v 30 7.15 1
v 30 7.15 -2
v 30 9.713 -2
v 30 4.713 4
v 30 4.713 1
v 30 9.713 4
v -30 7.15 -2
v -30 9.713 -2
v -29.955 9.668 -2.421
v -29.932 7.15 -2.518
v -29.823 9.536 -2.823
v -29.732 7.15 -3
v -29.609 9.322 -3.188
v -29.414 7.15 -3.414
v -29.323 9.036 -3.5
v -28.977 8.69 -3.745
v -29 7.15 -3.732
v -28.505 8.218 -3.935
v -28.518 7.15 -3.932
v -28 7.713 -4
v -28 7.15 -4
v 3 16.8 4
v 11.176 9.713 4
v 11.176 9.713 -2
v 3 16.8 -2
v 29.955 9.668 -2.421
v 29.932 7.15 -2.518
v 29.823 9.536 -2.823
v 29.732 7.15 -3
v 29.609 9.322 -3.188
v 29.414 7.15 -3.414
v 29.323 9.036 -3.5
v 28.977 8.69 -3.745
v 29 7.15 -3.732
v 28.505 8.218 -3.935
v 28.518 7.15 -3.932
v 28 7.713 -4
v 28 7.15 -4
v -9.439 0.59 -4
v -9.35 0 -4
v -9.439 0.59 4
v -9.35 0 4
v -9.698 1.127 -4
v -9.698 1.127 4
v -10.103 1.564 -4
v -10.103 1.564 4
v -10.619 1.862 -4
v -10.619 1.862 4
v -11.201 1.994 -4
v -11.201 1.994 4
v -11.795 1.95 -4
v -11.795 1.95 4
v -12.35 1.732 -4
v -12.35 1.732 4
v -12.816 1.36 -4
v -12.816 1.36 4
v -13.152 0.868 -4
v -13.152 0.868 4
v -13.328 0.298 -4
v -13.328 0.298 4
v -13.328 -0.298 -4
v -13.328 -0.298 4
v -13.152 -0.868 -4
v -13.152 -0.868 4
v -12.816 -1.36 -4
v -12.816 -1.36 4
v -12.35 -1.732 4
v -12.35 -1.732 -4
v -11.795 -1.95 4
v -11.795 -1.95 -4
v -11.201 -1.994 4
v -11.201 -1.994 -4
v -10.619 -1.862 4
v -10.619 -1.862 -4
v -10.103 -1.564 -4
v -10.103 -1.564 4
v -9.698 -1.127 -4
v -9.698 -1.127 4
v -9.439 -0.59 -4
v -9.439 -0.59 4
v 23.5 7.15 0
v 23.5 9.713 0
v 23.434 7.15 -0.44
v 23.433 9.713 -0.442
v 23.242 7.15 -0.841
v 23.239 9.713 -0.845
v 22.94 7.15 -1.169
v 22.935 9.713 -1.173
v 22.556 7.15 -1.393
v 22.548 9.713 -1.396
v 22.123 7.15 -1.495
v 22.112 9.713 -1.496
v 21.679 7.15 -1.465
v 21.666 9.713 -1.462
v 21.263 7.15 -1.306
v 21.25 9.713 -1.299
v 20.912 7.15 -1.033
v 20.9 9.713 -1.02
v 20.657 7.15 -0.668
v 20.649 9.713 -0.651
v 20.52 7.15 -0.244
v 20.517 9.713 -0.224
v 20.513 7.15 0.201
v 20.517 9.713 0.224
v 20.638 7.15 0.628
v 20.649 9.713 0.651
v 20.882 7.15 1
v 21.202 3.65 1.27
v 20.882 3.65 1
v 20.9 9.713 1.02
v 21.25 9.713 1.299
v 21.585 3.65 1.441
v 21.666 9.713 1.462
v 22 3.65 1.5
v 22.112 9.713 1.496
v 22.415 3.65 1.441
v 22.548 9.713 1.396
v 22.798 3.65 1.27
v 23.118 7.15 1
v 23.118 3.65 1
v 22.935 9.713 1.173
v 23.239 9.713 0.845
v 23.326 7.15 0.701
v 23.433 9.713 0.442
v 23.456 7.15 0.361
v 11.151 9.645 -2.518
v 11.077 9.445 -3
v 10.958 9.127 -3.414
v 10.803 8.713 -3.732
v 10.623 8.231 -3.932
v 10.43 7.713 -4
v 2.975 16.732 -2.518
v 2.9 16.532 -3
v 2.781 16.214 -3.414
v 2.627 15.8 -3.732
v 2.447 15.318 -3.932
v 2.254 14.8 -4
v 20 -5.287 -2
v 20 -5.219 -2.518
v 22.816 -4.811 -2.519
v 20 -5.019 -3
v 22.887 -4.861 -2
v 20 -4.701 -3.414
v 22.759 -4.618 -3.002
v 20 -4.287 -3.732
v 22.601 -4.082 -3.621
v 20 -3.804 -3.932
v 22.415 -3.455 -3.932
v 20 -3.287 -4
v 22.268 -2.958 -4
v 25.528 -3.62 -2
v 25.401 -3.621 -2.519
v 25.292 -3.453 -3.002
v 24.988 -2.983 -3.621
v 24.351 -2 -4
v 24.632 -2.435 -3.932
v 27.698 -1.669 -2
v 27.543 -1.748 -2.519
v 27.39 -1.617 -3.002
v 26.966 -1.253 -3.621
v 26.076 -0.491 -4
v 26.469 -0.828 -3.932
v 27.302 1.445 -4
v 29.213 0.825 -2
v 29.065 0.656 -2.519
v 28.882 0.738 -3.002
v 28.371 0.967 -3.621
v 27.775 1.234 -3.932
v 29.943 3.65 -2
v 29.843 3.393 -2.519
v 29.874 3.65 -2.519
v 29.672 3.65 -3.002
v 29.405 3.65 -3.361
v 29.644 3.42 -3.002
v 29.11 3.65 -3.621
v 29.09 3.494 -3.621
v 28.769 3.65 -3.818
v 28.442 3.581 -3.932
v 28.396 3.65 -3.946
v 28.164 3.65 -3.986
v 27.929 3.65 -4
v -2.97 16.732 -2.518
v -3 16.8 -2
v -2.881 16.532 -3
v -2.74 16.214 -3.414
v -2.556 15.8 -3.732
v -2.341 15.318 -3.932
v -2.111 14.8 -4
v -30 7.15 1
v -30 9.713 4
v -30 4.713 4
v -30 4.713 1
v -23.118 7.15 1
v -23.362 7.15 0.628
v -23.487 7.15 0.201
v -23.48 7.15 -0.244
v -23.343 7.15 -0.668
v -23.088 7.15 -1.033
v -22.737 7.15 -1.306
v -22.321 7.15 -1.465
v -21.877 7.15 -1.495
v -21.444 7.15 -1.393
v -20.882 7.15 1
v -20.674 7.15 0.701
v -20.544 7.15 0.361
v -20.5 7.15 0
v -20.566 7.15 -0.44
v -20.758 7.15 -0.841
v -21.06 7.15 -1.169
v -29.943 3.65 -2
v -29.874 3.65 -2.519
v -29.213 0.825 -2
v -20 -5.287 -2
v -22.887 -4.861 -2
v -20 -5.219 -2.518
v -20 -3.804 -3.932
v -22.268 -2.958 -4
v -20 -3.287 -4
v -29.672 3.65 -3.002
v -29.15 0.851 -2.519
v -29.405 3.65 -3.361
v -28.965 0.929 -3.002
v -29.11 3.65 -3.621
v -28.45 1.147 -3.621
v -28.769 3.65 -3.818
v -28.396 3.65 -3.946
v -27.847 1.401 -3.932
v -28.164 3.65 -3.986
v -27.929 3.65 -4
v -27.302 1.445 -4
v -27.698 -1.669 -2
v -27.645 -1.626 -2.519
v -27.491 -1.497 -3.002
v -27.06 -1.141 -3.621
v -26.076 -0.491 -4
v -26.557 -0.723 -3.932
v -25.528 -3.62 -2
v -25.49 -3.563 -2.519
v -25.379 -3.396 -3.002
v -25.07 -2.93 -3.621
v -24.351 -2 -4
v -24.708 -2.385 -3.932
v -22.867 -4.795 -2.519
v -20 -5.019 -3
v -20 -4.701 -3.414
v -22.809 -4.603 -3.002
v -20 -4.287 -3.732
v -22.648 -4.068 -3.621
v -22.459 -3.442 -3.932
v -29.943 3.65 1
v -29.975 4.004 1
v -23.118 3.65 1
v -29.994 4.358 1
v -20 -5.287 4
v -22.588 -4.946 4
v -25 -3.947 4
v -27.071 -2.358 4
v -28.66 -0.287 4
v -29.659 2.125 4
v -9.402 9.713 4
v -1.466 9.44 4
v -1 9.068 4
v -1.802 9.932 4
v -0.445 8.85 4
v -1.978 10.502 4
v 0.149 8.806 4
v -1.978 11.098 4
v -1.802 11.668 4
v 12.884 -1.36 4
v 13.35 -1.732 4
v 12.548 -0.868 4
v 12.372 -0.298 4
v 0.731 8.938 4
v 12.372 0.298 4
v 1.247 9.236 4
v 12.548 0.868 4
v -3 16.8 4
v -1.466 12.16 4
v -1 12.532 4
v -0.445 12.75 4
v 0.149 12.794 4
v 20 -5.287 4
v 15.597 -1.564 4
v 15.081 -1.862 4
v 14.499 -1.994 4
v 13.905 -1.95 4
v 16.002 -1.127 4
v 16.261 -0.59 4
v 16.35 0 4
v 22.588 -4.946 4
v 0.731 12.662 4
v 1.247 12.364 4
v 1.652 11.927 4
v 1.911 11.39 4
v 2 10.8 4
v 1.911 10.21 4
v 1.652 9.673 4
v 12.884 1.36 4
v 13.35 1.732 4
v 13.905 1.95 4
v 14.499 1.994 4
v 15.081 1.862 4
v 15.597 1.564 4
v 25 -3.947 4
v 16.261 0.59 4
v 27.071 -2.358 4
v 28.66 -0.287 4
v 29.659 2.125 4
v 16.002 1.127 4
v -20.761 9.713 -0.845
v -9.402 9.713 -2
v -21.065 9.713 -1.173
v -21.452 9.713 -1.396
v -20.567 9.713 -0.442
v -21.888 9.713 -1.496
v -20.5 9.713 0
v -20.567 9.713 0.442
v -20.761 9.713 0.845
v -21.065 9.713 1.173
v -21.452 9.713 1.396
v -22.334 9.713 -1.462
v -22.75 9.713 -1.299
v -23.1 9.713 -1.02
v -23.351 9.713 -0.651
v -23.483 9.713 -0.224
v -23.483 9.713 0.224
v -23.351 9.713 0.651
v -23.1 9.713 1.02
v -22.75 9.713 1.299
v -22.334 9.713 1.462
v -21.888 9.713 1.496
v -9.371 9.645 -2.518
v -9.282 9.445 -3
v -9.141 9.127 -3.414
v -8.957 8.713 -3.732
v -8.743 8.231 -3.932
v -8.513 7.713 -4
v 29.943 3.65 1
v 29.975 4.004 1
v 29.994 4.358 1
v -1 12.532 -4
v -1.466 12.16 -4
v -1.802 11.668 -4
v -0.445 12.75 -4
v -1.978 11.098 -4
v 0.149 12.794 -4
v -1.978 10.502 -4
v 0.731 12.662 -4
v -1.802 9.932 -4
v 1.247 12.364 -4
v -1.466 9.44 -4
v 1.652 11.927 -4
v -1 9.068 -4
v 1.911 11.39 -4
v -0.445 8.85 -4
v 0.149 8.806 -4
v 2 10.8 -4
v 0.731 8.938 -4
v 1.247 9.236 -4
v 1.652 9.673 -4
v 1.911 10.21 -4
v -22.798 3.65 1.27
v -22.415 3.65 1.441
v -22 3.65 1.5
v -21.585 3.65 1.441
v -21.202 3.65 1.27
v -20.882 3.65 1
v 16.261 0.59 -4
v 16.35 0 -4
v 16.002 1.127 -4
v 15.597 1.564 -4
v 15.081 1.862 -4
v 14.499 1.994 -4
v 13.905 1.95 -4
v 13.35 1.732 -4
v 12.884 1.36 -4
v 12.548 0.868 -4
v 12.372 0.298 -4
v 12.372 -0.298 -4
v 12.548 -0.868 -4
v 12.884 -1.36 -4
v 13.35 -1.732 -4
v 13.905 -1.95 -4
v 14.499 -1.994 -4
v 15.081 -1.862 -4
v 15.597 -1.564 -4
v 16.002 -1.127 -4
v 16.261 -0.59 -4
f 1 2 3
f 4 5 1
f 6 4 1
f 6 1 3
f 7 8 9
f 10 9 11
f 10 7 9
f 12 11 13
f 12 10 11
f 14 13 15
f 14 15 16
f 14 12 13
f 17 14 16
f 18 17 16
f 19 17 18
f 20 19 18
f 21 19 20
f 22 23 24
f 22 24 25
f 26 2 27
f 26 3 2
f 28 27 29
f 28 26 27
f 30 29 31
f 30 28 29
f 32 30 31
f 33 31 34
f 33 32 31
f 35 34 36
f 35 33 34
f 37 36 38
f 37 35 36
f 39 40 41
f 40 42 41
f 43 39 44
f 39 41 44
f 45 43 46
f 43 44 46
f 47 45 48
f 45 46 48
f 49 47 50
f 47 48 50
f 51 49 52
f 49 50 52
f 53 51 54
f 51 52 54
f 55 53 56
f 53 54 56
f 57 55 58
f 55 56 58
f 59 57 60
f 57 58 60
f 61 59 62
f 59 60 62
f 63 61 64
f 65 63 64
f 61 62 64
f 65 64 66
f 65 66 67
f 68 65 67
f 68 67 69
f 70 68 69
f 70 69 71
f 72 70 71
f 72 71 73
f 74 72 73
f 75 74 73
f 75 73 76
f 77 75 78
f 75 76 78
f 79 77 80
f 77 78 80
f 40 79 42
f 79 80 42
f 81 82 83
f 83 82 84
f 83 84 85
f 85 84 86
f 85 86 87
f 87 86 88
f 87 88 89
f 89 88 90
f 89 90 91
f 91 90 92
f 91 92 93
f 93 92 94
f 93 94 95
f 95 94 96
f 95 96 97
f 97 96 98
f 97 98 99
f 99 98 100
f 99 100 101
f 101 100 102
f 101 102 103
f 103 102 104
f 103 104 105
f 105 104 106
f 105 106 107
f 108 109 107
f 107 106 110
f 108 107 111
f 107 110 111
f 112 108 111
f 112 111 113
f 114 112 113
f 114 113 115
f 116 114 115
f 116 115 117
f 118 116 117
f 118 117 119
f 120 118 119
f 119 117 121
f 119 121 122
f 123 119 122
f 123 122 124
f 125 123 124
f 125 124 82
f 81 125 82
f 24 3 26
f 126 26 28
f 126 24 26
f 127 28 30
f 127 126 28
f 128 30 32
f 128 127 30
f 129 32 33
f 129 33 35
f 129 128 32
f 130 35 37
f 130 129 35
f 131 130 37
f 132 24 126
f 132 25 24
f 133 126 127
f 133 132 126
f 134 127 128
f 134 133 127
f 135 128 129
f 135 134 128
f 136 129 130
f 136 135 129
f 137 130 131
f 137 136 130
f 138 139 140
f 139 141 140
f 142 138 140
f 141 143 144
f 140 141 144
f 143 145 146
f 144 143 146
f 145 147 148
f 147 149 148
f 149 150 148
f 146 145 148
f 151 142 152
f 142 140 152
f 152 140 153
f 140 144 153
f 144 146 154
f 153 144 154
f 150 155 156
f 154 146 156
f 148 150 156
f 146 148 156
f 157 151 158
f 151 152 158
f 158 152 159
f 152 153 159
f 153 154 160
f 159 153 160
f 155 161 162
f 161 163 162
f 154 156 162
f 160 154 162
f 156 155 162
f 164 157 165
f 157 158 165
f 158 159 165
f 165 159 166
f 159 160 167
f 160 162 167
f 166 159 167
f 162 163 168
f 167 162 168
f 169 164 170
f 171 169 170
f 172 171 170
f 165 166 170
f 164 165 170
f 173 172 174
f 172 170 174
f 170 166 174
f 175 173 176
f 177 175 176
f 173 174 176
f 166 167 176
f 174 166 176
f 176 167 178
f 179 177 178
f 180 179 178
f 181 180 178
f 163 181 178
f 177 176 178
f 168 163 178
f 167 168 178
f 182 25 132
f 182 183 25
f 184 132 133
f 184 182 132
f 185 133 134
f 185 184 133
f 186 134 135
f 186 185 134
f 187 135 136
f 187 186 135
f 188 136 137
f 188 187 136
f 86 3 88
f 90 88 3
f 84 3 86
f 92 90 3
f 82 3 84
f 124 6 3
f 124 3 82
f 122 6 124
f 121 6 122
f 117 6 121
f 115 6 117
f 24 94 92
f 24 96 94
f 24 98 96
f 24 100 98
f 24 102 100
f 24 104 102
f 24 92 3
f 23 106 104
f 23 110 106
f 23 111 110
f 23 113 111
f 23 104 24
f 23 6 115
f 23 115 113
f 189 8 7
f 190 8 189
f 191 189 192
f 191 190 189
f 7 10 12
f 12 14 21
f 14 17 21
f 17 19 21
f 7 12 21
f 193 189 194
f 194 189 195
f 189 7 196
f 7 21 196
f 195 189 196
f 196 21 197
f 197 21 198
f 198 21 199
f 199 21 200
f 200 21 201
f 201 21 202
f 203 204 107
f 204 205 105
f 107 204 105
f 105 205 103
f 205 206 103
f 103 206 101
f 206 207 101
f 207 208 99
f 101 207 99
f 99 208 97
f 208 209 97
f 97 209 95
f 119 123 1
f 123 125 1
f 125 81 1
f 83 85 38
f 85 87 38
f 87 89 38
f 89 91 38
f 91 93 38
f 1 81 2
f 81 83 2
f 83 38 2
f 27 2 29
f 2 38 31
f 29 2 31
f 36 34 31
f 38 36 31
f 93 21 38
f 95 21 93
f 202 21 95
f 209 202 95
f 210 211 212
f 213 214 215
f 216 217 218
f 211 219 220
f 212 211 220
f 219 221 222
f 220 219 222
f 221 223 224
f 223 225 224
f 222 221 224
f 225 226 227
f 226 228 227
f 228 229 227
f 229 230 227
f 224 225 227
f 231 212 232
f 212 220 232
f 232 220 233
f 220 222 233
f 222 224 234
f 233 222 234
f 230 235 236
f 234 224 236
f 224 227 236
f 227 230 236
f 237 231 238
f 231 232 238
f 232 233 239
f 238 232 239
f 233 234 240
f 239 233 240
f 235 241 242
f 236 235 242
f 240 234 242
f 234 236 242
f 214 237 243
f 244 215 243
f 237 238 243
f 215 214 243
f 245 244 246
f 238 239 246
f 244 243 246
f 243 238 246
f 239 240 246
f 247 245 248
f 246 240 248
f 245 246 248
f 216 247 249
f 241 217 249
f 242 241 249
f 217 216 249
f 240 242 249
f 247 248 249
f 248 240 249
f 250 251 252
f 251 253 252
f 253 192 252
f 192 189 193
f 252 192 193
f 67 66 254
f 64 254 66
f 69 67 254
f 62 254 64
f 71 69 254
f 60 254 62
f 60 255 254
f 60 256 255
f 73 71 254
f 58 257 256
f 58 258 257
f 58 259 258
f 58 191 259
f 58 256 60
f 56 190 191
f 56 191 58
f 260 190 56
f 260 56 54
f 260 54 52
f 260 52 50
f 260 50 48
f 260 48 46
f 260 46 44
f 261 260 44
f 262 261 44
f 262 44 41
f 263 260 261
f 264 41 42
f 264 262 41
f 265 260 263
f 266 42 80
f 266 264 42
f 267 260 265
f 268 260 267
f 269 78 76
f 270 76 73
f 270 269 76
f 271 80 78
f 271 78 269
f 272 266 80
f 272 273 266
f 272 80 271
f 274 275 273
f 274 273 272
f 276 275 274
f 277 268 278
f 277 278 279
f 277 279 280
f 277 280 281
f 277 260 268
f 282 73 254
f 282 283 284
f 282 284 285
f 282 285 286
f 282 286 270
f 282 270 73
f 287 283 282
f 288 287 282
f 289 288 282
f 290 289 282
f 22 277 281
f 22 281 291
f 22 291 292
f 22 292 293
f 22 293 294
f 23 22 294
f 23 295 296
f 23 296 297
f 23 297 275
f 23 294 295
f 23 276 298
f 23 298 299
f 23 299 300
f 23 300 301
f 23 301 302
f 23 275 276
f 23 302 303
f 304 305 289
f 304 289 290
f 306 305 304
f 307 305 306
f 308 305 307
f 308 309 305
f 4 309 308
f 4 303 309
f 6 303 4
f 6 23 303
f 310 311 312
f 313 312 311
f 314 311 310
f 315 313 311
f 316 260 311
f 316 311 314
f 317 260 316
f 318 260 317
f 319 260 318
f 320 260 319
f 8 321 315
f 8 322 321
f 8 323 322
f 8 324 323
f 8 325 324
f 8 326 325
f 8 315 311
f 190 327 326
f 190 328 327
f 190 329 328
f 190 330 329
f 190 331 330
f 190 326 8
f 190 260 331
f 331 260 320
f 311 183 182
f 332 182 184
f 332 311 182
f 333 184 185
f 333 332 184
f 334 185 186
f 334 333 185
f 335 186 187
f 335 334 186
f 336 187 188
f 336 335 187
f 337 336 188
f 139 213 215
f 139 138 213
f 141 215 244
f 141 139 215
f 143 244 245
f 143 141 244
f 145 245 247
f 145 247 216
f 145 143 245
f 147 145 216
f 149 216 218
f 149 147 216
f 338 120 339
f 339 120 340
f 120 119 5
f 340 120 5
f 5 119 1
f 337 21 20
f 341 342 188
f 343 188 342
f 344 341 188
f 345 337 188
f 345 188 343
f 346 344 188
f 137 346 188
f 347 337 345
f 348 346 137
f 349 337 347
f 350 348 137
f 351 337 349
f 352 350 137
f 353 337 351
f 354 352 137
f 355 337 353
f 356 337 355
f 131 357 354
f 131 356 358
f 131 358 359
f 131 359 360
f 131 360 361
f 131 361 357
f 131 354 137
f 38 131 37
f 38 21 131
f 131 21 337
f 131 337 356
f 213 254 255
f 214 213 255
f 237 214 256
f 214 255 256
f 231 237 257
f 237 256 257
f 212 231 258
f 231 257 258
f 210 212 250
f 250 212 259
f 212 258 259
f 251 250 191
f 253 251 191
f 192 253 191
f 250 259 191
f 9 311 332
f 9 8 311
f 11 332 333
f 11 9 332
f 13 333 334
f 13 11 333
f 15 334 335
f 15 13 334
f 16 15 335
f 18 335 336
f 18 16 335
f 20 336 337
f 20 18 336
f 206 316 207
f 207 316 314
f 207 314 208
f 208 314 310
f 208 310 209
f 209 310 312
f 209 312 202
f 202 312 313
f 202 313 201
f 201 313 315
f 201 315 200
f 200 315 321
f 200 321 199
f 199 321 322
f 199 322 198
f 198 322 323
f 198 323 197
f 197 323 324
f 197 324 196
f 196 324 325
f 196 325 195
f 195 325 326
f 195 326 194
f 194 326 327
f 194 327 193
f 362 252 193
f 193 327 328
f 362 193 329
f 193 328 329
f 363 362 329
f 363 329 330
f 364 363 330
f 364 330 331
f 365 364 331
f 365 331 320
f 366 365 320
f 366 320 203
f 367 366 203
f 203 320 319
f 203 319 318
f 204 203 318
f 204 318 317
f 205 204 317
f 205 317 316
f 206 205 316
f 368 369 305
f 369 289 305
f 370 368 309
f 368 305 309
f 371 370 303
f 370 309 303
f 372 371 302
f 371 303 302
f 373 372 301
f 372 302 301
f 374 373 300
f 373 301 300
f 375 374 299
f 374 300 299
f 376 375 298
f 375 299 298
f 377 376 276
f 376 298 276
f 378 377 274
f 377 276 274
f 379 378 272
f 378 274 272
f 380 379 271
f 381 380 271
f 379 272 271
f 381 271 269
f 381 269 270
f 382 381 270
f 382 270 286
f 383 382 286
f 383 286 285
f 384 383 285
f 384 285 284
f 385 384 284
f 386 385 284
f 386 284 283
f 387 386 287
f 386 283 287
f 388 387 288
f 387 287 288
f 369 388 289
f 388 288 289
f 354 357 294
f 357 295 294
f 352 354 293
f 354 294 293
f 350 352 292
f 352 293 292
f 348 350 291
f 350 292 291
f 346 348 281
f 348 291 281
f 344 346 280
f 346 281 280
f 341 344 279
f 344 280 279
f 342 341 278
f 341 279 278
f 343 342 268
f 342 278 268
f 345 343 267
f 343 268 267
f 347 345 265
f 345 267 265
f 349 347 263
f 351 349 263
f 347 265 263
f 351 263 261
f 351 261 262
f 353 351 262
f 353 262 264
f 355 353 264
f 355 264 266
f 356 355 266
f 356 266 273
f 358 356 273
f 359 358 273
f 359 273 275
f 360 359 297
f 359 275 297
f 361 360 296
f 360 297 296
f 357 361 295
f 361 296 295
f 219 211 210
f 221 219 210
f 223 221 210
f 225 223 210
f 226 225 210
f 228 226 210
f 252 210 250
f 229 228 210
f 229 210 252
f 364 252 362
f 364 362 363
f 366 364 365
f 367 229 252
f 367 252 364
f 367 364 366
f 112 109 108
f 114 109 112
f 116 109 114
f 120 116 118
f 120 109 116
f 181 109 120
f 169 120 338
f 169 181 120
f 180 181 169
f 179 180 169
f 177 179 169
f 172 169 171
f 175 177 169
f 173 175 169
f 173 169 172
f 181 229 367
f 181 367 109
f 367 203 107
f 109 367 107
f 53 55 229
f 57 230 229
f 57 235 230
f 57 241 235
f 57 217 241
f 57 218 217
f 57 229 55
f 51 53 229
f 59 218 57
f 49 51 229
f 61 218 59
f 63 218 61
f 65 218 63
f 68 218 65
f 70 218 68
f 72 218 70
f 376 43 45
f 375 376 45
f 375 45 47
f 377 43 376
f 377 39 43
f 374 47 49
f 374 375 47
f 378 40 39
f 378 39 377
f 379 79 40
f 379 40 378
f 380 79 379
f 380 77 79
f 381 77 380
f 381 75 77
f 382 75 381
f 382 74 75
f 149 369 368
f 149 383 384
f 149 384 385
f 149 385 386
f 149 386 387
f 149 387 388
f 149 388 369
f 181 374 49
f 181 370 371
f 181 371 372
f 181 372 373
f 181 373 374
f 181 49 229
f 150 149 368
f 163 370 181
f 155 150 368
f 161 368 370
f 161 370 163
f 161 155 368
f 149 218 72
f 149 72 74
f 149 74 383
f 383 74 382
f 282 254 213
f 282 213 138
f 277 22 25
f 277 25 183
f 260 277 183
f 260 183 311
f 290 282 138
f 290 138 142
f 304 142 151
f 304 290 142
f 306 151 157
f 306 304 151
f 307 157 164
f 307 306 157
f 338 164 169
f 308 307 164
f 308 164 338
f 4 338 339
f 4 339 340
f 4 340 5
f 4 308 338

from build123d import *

# Parameters (mm, degrees)
BOSS_EXTRU_1_DEPTH             = 4
BOSS_EXTRU_1_DEPTH_BACK        = 4
ESQUISSE3_R                    = 2
ENL_V_MAT_EXTRU_1_DEPTH        = 5
ENL_V_MAT_EXTRU_1_DEPTH_BACK   = 5
BOSS_EXTRU_2_REACH             = 6
BOSS_EXTRU_2_DIRECTION_2_REACH = 6
ENL_V_START                    = -4
ESQUISSE4_W                    = 60
ESQUISSE4_H                    = 3.5
ENL_V_MAT_EXTRU_2_DEPTH        = 5
ENL_V_START_2                  = 9.713229
ESQUISSE7_R                    = 1.5
ENL_V_MAT_EXTRU_4_DEPTH        = 6.063229
CONG_1_R                       = 10
CONG_2_R                       = 2


with BuildPart() as part:
    # Esquisse1 → Boss.-Extru.1 (new body, two sides)
    with BuildSketch(Plane.XY) as boss_extru_1_sk:
        Polygon((-18.056919343, 0.131274222), (-15.479170984, -5.286770941), (18.771312817, -5.286770941), (21.159805355, 1.060426821), (3, 16.8), (-3, 16.8), align=None)
    extrude(amount=BOSS_EXTRU_1_DEPTH)
    extrude(boss_extru_1_sk.sketch, amount=-BOSS_EXTRU_1_DEPTH_BACK)

    # Esquisse3 → Enlèv. mat.-Extru.1 (cut, two sides)
    with BuildSketch(Plane.XY) as enl_v_mat_extru_1_sk:
        with Locations((0, 10.8)):
            Circle(ESQUISSE3_R)
        with Locations((-11.35, 0)):
            Circle(ESQUISSE3_R)
        with Locations((14.35, 0)):
            Circle(ESQUISSE3_R)
    extrude(amount=ENL_V_MAT_EXTRU_1_DEPTH, mode=Mode.SUBTRACT)
    extrude(enl_v_mat_extru_1_sk.sketch, amount=-ENL_V_MAT_EXTRU_1_DEPTH_BACK, mode=Mode.SUBTRACT)

    # Boss.-Extru.2: up to this face of the body (flat: up to its plane)
    boss_extru_2_end = Plane(part.part.faces().sort_by_distance((1.373128785, 3.366991502, 4))[0])
    # Esquisse6 → Boss.-Extru.2 (add, up to the picked face)
    with BuildSketch(Plane.XY, mode=Mode.PRIVATE) as boss_extru_2_sk1:
        Polygon((-9.401505424, 9.713229059), (-30, 9.713229059), (-30, -5.286770941), (-15.479170984, -5.286770941), (-18.056919343, 0.131274222), align=None)
    boss_extru_2_tool1 = split(extrude(boss_extru_2_sk1.sketch, amount=BOSS_EXTRU_2_REACH, mode=Mode.PRIVATE), bisect_by=boss_extru_2_end, keep=Keep.BOTH, mode=Mode.PRIVATE)
    add(boss_extru_2_tool1.solids().sort_by_distance((-22.205202, 2.823075, 0))[0])
    # Esquisse6 → Boss.-Extru.2 (add, up to the picked face)
    with BuildSketch(Plane.XY, mode=Mode.PRIVATE) as boss_extru_2_sk2:
        Polygon((18.771312817, -5.286770941), (30, -5.286770941), (30, 9.713229059), (11.176484802, 9.713229059), (21.159805355, 1.060426821), align=None)
    boss_extru_2_tool2 = split(extrude(boss_extru_2_sk2.sketch, amount=BOSS_EXTRU_2_REACH, mode=Mode.PRIVATE), bisect_by=boss_extru_2_end, keep=Keep.BOTH, mode=Mode.PRIVATE)
    add(boss_extru_2_tool2.solids().sort_by_distance((23.539357, 3.077844, 0))[0])

    # Boss.-Extru.2 direction 2: up to this face of the body (flat: up to its plane)
    boss_extru_2_direction_2_end = Plane(part.part.faces().sort_by_distance((1.373128785, 3.366991502, -4))[0])
    # Esquisse6 → Boss.-Extru.2 direction 2 (add, up to the picked face)
    with BuildSketch(Plane.XY, mode=Mode.PRIVATE) as boss_extru_2_direction_2_sk1:
        Polygon((-9.401505424, 9.713229059), (-30, 9.713229059), (-30, -5.286770941), (-15.479170984, -5.286770941), (-18.056919343, 0.131274222), align=None)
    boss_extru_2_direction_2_tool1 = split(extrude(boss_extru_2_direction_2_sk1.sketch, amount=-BOSS_EXTRU_2_DIRECTION_2_REACH, mode=Mode.PRIVATE), bisect_by=boss_extru_2_direction_2_end, keep=Keep.BOTH, mode=Mode.PRIVATE)
    add(boss_extru_2_direction_2_tool1.solids().sort_by_distance((-22.205202, 2.823075, 0))[0])
    # Esquisse6 → Boss.-Extru.2 direction 2 (add, up to the picked face)
    with BuildSketch(Plane.XY, mode=Mode.PRIVATE) as boss_extru_2_direction_2_sk2:
        Polygon((18.771312817, -5.286770941), (30, -5.286770941), (30, 9.713229059), (11.176484802, 9.713229059), (21.159805355, 1.060426821), align=None)
    boss_extru_2_direction_2_tool2 = split(extrude(boss_extru_2_direction_2_sk2.sketch, amount=-BOSS_EXTRU_2_DIRECTION_2_REACH, mode=Mode.PRIVATE), bisect_by=boss_extru_2_direction_2_end, keep=Keep.BOTH, mode=Mode.PRIVATE)
    add(boss_extru_2_direction_2_tool2.solids().sort_by_distance((23.539357, 3.077844, 0))[0])

    # Esquisse4 → Enlèv. mat.-Extru.2 (cut)
    with BuildSketch(Plane.XY.offset(ENL_V_START)):
        with Locations((0, 5.4)):
            Rectangle(ESQUISSE4_W, ESQUISSE4_H)
    extrude(amount=ENL_V_MAT_EXTRU_2_DEPTH, mode=Mode.SUBTRACT)

    # Esquisse7 → Enlèv. mat.-Extru.4 (cut)
    with BuildSketch(Plane(origin=(0, 0, 0), x_dir=(1, 0, 0), z_dir=(0, 1, 0)).offset(ENL_V_START_2)):
        with Locations((-22, 0)):
            Circle(ESQUISSE7_R)
        with Locations((22, 0)):
            Circle(ESQUISSE7_R)
    extrude(amount=-ENL_V_MAT_EXTRU_4_DEPTH, mode=Mode.SUBTRACT)

    # Congé1
    cong_1_edges = [part.edges().sort_by_distance(p)[0] for p in [
        (30, -5.286770941, 0),
        (-30, -5.286770941, 0),
    ]]
    fillet(cong_1_edges, radius=CONG_1_R)

    # Congé2
    cong_2_edges = [part.edges().sort_by_distance(p)[0] for p in [
        (0, -5.286770941, -4),
        (-26.684598321, -2.724253398, -4),
        (26.684598321, -2.724253398, -4),
        (0, 16.8, -4),
        (-6.200752712, 13.256614529, -4),
        (-19.700752712, 9.713229059, -4),
        (-30, 8.431614529, -4),
        (7.088242401, 13.256614529, -4),
        (20.588242401, 9.713229059, -4),
        (30, 8.431614529, -4),
    ]]
    fillet(cong_2_edges, radius=CONG_2_R)


solid = part.part
